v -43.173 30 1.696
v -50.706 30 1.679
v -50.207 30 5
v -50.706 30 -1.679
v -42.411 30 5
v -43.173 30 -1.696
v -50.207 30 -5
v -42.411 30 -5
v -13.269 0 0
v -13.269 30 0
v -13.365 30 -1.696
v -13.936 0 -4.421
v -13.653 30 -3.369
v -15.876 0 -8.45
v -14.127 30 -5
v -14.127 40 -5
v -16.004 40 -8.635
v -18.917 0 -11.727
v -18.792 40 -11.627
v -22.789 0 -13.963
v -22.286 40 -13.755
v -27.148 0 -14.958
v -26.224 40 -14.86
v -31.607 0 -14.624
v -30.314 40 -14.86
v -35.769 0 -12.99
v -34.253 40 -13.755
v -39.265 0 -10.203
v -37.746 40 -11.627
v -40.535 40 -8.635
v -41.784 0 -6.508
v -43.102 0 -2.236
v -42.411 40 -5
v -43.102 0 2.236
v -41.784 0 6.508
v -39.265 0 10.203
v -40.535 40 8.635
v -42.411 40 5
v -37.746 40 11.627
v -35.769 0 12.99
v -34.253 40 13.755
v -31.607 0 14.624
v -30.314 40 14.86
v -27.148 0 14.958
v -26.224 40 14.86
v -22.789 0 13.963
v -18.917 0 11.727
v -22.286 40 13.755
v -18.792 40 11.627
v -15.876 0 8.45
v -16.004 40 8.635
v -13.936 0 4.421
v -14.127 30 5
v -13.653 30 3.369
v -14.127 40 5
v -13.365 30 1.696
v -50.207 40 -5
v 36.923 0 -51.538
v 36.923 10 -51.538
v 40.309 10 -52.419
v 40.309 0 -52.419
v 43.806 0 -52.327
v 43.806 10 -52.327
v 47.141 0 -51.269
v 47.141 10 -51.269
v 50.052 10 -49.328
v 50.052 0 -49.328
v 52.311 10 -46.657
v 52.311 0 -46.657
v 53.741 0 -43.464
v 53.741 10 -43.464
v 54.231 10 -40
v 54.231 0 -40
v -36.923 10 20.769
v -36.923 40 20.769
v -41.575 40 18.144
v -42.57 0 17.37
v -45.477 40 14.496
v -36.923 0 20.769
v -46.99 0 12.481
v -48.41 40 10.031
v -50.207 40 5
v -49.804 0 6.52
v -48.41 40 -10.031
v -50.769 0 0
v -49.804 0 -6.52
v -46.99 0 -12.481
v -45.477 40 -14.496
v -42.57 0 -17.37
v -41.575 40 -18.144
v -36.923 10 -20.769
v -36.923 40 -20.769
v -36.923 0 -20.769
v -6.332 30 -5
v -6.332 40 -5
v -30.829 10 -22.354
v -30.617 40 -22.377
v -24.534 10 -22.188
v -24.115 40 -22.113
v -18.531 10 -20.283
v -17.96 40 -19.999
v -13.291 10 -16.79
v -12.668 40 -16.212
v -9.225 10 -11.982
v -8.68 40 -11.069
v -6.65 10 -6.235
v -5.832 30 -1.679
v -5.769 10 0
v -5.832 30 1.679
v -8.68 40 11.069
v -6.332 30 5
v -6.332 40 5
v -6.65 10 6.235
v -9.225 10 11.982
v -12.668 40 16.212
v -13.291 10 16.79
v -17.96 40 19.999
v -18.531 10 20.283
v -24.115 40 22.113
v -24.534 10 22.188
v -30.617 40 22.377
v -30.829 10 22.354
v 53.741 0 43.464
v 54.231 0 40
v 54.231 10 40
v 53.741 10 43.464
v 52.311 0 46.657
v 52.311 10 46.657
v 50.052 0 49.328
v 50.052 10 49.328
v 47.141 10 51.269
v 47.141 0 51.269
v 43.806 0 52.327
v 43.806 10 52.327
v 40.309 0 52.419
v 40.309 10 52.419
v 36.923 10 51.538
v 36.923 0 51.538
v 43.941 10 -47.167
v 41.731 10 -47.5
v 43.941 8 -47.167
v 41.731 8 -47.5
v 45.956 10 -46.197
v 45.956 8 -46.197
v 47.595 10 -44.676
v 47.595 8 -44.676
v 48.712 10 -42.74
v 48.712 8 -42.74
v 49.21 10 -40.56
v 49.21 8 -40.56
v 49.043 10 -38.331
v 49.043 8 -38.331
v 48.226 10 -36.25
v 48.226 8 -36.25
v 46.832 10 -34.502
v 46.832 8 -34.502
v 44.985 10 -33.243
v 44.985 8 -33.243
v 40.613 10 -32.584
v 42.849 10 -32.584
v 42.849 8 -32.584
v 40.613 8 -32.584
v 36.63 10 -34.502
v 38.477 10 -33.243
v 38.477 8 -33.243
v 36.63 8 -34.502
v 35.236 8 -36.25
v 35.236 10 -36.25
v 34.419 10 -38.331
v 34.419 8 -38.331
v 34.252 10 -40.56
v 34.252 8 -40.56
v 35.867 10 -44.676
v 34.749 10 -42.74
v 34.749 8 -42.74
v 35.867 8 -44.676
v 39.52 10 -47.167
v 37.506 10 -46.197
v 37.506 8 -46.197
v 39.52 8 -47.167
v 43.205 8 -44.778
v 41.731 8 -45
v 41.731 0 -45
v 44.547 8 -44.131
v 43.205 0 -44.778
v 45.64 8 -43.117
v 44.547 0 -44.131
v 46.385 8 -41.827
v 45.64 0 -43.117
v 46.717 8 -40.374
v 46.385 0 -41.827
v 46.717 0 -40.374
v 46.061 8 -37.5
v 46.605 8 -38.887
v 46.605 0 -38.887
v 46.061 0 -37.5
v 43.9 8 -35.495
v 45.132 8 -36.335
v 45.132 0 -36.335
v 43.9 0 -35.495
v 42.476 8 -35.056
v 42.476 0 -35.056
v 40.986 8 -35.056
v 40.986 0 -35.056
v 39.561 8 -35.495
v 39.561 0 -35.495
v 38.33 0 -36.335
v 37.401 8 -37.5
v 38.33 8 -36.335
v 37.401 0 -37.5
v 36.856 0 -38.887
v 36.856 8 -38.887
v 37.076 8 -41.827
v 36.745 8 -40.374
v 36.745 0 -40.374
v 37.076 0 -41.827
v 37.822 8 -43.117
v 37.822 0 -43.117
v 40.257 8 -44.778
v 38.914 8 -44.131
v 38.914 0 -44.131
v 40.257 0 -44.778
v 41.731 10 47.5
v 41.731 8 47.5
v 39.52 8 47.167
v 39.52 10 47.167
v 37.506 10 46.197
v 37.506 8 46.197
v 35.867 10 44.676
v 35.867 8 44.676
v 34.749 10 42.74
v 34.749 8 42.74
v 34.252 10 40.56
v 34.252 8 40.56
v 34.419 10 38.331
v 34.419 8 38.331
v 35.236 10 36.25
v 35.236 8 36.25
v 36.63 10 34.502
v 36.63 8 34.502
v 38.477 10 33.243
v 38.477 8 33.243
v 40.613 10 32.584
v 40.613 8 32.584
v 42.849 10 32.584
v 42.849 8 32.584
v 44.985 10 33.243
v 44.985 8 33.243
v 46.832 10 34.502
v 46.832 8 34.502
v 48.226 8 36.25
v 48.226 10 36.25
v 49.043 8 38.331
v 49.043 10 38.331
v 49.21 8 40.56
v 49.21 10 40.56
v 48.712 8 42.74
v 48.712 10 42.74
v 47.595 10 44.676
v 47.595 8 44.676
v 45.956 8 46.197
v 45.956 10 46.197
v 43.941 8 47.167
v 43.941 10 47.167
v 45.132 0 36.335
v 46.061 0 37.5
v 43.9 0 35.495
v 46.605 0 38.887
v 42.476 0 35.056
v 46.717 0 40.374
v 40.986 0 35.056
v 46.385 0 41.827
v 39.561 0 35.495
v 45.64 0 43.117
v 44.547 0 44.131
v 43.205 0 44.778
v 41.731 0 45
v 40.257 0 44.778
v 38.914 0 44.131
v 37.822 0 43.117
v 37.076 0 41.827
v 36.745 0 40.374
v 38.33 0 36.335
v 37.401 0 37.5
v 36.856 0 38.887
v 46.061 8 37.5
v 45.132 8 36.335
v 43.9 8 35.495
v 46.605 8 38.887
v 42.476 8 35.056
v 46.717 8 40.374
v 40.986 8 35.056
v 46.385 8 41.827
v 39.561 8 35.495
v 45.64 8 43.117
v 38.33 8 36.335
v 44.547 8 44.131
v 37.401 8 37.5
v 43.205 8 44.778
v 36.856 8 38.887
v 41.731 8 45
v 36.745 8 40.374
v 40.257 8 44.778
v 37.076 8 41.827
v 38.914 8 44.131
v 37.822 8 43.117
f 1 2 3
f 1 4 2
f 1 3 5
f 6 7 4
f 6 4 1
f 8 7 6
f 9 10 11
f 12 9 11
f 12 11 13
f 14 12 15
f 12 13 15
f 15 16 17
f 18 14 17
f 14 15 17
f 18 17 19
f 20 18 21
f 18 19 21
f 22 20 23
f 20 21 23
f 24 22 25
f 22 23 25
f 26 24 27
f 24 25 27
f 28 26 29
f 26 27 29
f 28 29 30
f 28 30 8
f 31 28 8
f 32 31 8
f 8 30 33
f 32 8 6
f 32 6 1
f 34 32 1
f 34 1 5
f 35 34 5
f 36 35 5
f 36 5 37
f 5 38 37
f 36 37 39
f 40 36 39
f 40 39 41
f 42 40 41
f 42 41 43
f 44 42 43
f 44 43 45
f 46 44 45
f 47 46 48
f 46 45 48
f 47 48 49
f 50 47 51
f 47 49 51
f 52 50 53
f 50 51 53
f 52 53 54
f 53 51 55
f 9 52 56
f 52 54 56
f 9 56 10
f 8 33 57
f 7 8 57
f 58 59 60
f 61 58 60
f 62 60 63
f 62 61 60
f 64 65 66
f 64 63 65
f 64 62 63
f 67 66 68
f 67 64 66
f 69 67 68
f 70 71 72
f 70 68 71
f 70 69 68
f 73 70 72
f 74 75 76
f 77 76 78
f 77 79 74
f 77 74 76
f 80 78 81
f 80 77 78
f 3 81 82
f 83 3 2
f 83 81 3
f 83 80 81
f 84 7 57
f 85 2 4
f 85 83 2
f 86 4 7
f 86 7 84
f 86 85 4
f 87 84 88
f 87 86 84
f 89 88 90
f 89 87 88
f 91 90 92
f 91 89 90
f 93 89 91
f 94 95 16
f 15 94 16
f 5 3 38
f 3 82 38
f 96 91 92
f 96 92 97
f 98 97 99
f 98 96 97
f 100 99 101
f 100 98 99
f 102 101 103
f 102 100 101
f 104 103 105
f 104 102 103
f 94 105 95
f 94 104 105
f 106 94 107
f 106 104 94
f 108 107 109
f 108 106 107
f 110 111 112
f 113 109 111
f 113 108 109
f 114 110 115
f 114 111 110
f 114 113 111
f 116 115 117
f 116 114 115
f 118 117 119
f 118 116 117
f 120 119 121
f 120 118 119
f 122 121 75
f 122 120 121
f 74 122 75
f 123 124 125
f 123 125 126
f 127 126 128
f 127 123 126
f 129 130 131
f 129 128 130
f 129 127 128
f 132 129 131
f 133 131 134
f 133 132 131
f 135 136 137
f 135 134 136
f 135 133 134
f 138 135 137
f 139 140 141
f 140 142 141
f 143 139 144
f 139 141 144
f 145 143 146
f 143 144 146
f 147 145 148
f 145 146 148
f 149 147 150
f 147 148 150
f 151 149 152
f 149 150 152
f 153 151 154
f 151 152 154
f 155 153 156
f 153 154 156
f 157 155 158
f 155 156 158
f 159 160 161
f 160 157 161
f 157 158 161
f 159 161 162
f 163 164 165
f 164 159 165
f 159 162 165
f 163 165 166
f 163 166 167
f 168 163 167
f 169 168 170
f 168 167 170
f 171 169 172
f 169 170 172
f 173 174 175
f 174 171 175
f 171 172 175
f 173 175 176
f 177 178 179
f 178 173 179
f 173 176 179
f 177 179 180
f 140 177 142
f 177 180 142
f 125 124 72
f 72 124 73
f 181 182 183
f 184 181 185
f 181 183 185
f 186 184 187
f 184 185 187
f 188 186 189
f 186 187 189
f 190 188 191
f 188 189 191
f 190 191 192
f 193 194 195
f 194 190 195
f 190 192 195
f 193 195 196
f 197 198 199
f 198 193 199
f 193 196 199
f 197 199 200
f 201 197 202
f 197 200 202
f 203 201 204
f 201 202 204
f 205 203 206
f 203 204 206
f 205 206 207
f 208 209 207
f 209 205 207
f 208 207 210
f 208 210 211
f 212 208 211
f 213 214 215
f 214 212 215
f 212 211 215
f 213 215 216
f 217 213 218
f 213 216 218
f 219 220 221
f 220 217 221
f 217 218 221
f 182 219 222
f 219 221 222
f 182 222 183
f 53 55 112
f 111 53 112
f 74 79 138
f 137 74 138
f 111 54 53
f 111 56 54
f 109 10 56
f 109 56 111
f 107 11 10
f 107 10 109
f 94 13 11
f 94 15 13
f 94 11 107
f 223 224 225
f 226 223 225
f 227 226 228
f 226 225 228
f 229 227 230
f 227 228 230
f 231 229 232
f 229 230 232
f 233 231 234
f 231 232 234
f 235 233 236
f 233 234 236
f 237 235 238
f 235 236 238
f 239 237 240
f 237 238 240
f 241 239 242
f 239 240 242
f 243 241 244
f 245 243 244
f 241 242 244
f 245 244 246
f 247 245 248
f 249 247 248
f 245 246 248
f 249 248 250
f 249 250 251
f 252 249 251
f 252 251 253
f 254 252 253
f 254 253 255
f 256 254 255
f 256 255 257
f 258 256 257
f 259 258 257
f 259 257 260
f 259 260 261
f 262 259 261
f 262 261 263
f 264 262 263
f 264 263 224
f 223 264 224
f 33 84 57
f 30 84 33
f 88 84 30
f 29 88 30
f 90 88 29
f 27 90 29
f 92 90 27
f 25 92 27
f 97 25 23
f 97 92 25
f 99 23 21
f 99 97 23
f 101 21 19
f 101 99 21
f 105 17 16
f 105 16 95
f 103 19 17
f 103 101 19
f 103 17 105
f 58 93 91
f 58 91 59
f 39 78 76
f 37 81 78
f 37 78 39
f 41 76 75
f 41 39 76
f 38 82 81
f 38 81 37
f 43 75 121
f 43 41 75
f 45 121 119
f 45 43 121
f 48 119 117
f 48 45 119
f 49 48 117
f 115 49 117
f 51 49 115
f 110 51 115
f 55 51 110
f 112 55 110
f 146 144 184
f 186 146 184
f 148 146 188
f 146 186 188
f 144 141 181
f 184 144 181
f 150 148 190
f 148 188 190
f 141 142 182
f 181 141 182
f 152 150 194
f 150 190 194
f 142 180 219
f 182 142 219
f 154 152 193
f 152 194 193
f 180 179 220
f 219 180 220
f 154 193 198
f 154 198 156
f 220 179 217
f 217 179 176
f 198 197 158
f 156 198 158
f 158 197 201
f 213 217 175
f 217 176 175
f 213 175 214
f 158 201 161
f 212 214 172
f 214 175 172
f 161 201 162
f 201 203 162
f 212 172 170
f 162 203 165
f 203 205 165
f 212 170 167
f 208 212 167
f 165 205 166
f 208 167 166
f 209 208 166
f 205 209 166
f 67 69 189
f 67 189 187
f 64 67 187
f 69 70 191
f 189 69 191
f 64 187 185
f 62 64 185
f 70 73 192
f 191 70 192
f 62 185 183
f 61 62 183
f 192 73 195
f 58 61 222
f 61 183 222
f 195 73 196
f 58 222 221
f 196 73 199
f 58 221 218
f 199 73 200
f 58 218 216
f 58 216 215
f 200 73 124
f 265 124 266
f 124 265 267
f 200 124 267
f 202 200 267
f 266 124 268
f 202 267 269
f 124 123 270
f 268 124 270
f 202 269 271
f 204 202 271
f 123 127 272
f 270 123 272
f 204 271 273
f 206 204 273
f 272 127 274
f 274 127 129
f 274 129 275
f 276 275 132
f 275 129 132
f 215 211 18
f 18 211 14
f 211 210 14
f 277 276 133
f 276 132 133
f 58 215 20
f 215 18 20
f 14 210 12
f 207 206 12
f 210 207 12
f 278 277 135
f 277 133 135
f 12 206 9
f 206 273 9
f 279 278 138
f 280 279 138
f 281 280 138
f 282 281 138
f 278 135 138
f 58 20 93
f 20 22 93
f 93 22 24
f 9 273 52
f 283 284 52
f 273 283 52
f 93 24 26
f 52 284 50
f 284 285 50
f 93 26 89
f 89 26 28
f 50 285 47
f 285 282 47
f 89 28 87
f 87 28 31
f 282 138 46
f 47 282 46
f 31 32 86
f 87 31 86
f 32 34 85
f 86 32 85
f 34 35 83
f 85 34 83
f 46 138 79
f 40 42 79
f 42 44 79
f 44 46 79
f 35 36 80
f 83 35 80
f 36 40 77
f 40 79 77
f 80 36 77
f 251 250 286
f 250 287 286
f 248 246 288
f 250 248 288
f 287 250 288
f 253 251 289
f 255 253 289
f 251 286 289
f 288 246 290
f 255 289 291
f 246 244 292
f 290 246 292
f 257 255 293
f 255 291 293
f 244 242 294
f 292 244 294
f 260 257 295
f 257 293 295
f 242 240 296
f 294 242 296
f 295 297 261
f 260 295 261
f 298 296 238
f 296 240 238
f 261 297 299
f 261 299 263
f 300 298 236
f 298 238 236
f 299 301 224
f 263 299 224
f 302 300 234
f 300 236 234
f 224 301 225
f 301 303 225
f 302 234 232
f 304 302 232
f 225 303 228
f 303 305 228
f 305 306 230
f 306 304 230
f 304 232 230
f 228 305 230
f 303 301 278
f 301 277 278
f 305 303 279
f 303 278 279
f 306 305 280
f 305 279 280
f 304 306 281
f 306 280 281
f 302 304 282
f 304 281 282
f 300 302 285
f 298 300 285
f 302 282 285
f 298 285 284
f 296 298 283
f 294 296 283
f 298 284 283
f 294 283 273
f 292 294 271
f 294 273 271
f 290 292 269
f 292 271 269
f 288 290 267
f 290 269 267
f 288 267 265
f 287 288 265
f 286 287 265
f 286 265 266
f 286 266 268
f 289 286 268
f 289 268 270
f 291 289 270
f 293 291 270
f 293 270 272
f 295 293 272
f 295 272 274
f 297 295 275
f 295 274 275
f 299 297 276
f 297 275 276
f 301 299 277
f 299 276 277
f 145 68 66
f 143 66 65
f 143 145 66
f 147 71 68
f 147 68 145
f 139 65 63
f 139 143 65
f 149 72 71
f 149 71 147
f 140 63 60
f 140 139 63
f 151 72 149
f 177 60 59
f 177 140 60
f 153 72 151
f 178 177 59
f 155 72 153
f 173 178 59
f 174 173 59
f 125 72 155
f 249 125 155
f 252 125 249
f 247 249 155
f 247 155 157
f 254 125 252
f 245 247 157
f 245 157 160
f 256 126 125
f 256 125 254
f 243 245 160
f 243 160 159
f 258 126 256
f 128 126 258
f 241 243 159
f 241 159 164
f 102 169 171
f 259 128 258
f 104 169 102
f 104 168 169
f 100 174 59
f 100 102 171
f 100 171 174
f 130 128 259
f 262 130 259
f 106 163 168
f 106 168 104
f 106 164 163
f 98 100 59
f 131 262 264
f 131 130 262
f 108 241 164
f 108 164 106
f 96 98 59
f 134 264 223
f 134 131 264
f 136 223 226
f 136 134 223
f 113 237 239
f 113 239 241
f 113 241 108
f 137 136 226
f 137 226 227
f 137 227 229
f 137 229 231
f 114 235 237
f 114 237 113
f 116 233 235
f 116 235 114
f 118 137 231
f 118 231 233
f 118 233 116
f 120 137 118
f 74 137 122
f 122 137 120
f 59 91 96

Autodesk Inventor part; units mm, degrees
ref_plane "YZ Plane" through (0, 0, 0) normal (1, 0, 0) x (0, 1, 0)
ref_plane "XZ Plane" through (0, 0, 0) normal (0, 1, 0) x (-1, 0, 0)
ref_plane "XY Plane" through (0, 0, 0) normal (0, 0, 1) x (1, 0, 0)
sketch "Sketch1" plane through (0, 0, 0) normal (0, 1, 0) x (-1, 0, 0)
  arc A0 (36.9231, -20.7692) -> (36.9231, 20.7692) centre (28.2692, 0) ccw
  line L0 (36.9231, 20.7692) -> (-36.9231, 51.5385)
  line L1 (36.9231, -20.7692) -> (-36.9231, -51.5385)
  arc A1 (-36.9231, 51.5385) -> (-54.2308, 40) centre (-41.7308, 40) ccw
  arc A2 (-54.2308, -40) -> (-36.9231, -51.5385) centre (-41.7308, -40) ccw
  line L2 (72.3868, 0) -> (-78.9359, 0) projected
  line L3 (0, -78.6378) -> (0, 78.6378) projected
  line L4 (-54.2308, 40) -> (-54.2308, -40)
  point P0 (0, 0)
  point P1 (0, -36.1538)
  point P2 (0, 36.1538)
  point P3 (-54.2308, 0)
  dimension "d0" = 70
  dimension "d1" = 80
  dimension "d2" = 12.5
  dimension "d3" = 45
extrude "Extrusion1" add sketch "Sketch1" along normal blind 10
sketch "Sketch2" plane through (0, 10, 0) normal (0, 1, 0) x (1, 0, 0)
  line L0 (-36.9231, -20.7692) -> (36.9231, -51.5385) projected
  arc A0 (36.9231, -51.5385) -> (54.2308, -40) centre (41.7308, -40) ccw projected
  line L1 (54.2308, -40) -> (54.2308, 40) projected
  arc A1 (54.2308, 40) -> (36.9231, 51.5385) centre (41.7308, 40) ccw projected
  line L2 (36.9231, 51.5385) -> (-36.9231, 20.7692) projected
  arc A2 (-36.9231, 20.7692) -> (-36.9231, -20.7692) centre (-28.2692, 0) ccw projected
  circle A3 centre (-28.2692, 0) radius 22.5
  point P0 (0, 0)
extrude "Extrusion2" add sketch "Sketch2" along normal blind 30 contours A2 A3
sketch "Sketch3" plane through (-28.2692, 40, 0) normal (0, 1, 0) x (1, 0, 0)
  circle A0 centre (0, 0) radius 15
  point P0 (28.2692, 0)
  dimension "d8" = 30
extrude "Extrusion3" cut sketch "Sketch3" against normal through all
sketch "Sketch4" plane through (-28.2692, 40, 0) normal (0, 1, 0) x (1, 0, 0)
  line L0 (-24.7308, -5) -> (25.2692, -5)
  line L1 (25.2692, -5) -> (25.2692, 5)
  line L2 (25.2692, 5) -> (-24.7308, 5)
  line L3 (-24.7308, 5) -> (-24.7308, -5)
  line L4 (-59.7, 0) -> (106.2, 0) projected
  line L5 (28.2692, 73.5) -> (28.2692, -73.5) projected
  point P0 (28.2692, 0)
  point P1 (-24.7308, 0)
  dimension "d14" = 10
  dimension "d15" = 50
  dimension "d16" = 3
extrude "Extrusion4" cut sketch "Sketch4" against normal blind 10
hole "Hole1" at (41.7308, 10, 40) direction (0, -1, 0) diameter 10 end through all counterbore diameter 15 counterbore depth 2
mirror "Mirror1" about plane through (0, 0, 0) normal (0, 0, 1) of "Hole1"
properties part number "Workshop_1_Soln" material "Bronze, Soft Tin"
